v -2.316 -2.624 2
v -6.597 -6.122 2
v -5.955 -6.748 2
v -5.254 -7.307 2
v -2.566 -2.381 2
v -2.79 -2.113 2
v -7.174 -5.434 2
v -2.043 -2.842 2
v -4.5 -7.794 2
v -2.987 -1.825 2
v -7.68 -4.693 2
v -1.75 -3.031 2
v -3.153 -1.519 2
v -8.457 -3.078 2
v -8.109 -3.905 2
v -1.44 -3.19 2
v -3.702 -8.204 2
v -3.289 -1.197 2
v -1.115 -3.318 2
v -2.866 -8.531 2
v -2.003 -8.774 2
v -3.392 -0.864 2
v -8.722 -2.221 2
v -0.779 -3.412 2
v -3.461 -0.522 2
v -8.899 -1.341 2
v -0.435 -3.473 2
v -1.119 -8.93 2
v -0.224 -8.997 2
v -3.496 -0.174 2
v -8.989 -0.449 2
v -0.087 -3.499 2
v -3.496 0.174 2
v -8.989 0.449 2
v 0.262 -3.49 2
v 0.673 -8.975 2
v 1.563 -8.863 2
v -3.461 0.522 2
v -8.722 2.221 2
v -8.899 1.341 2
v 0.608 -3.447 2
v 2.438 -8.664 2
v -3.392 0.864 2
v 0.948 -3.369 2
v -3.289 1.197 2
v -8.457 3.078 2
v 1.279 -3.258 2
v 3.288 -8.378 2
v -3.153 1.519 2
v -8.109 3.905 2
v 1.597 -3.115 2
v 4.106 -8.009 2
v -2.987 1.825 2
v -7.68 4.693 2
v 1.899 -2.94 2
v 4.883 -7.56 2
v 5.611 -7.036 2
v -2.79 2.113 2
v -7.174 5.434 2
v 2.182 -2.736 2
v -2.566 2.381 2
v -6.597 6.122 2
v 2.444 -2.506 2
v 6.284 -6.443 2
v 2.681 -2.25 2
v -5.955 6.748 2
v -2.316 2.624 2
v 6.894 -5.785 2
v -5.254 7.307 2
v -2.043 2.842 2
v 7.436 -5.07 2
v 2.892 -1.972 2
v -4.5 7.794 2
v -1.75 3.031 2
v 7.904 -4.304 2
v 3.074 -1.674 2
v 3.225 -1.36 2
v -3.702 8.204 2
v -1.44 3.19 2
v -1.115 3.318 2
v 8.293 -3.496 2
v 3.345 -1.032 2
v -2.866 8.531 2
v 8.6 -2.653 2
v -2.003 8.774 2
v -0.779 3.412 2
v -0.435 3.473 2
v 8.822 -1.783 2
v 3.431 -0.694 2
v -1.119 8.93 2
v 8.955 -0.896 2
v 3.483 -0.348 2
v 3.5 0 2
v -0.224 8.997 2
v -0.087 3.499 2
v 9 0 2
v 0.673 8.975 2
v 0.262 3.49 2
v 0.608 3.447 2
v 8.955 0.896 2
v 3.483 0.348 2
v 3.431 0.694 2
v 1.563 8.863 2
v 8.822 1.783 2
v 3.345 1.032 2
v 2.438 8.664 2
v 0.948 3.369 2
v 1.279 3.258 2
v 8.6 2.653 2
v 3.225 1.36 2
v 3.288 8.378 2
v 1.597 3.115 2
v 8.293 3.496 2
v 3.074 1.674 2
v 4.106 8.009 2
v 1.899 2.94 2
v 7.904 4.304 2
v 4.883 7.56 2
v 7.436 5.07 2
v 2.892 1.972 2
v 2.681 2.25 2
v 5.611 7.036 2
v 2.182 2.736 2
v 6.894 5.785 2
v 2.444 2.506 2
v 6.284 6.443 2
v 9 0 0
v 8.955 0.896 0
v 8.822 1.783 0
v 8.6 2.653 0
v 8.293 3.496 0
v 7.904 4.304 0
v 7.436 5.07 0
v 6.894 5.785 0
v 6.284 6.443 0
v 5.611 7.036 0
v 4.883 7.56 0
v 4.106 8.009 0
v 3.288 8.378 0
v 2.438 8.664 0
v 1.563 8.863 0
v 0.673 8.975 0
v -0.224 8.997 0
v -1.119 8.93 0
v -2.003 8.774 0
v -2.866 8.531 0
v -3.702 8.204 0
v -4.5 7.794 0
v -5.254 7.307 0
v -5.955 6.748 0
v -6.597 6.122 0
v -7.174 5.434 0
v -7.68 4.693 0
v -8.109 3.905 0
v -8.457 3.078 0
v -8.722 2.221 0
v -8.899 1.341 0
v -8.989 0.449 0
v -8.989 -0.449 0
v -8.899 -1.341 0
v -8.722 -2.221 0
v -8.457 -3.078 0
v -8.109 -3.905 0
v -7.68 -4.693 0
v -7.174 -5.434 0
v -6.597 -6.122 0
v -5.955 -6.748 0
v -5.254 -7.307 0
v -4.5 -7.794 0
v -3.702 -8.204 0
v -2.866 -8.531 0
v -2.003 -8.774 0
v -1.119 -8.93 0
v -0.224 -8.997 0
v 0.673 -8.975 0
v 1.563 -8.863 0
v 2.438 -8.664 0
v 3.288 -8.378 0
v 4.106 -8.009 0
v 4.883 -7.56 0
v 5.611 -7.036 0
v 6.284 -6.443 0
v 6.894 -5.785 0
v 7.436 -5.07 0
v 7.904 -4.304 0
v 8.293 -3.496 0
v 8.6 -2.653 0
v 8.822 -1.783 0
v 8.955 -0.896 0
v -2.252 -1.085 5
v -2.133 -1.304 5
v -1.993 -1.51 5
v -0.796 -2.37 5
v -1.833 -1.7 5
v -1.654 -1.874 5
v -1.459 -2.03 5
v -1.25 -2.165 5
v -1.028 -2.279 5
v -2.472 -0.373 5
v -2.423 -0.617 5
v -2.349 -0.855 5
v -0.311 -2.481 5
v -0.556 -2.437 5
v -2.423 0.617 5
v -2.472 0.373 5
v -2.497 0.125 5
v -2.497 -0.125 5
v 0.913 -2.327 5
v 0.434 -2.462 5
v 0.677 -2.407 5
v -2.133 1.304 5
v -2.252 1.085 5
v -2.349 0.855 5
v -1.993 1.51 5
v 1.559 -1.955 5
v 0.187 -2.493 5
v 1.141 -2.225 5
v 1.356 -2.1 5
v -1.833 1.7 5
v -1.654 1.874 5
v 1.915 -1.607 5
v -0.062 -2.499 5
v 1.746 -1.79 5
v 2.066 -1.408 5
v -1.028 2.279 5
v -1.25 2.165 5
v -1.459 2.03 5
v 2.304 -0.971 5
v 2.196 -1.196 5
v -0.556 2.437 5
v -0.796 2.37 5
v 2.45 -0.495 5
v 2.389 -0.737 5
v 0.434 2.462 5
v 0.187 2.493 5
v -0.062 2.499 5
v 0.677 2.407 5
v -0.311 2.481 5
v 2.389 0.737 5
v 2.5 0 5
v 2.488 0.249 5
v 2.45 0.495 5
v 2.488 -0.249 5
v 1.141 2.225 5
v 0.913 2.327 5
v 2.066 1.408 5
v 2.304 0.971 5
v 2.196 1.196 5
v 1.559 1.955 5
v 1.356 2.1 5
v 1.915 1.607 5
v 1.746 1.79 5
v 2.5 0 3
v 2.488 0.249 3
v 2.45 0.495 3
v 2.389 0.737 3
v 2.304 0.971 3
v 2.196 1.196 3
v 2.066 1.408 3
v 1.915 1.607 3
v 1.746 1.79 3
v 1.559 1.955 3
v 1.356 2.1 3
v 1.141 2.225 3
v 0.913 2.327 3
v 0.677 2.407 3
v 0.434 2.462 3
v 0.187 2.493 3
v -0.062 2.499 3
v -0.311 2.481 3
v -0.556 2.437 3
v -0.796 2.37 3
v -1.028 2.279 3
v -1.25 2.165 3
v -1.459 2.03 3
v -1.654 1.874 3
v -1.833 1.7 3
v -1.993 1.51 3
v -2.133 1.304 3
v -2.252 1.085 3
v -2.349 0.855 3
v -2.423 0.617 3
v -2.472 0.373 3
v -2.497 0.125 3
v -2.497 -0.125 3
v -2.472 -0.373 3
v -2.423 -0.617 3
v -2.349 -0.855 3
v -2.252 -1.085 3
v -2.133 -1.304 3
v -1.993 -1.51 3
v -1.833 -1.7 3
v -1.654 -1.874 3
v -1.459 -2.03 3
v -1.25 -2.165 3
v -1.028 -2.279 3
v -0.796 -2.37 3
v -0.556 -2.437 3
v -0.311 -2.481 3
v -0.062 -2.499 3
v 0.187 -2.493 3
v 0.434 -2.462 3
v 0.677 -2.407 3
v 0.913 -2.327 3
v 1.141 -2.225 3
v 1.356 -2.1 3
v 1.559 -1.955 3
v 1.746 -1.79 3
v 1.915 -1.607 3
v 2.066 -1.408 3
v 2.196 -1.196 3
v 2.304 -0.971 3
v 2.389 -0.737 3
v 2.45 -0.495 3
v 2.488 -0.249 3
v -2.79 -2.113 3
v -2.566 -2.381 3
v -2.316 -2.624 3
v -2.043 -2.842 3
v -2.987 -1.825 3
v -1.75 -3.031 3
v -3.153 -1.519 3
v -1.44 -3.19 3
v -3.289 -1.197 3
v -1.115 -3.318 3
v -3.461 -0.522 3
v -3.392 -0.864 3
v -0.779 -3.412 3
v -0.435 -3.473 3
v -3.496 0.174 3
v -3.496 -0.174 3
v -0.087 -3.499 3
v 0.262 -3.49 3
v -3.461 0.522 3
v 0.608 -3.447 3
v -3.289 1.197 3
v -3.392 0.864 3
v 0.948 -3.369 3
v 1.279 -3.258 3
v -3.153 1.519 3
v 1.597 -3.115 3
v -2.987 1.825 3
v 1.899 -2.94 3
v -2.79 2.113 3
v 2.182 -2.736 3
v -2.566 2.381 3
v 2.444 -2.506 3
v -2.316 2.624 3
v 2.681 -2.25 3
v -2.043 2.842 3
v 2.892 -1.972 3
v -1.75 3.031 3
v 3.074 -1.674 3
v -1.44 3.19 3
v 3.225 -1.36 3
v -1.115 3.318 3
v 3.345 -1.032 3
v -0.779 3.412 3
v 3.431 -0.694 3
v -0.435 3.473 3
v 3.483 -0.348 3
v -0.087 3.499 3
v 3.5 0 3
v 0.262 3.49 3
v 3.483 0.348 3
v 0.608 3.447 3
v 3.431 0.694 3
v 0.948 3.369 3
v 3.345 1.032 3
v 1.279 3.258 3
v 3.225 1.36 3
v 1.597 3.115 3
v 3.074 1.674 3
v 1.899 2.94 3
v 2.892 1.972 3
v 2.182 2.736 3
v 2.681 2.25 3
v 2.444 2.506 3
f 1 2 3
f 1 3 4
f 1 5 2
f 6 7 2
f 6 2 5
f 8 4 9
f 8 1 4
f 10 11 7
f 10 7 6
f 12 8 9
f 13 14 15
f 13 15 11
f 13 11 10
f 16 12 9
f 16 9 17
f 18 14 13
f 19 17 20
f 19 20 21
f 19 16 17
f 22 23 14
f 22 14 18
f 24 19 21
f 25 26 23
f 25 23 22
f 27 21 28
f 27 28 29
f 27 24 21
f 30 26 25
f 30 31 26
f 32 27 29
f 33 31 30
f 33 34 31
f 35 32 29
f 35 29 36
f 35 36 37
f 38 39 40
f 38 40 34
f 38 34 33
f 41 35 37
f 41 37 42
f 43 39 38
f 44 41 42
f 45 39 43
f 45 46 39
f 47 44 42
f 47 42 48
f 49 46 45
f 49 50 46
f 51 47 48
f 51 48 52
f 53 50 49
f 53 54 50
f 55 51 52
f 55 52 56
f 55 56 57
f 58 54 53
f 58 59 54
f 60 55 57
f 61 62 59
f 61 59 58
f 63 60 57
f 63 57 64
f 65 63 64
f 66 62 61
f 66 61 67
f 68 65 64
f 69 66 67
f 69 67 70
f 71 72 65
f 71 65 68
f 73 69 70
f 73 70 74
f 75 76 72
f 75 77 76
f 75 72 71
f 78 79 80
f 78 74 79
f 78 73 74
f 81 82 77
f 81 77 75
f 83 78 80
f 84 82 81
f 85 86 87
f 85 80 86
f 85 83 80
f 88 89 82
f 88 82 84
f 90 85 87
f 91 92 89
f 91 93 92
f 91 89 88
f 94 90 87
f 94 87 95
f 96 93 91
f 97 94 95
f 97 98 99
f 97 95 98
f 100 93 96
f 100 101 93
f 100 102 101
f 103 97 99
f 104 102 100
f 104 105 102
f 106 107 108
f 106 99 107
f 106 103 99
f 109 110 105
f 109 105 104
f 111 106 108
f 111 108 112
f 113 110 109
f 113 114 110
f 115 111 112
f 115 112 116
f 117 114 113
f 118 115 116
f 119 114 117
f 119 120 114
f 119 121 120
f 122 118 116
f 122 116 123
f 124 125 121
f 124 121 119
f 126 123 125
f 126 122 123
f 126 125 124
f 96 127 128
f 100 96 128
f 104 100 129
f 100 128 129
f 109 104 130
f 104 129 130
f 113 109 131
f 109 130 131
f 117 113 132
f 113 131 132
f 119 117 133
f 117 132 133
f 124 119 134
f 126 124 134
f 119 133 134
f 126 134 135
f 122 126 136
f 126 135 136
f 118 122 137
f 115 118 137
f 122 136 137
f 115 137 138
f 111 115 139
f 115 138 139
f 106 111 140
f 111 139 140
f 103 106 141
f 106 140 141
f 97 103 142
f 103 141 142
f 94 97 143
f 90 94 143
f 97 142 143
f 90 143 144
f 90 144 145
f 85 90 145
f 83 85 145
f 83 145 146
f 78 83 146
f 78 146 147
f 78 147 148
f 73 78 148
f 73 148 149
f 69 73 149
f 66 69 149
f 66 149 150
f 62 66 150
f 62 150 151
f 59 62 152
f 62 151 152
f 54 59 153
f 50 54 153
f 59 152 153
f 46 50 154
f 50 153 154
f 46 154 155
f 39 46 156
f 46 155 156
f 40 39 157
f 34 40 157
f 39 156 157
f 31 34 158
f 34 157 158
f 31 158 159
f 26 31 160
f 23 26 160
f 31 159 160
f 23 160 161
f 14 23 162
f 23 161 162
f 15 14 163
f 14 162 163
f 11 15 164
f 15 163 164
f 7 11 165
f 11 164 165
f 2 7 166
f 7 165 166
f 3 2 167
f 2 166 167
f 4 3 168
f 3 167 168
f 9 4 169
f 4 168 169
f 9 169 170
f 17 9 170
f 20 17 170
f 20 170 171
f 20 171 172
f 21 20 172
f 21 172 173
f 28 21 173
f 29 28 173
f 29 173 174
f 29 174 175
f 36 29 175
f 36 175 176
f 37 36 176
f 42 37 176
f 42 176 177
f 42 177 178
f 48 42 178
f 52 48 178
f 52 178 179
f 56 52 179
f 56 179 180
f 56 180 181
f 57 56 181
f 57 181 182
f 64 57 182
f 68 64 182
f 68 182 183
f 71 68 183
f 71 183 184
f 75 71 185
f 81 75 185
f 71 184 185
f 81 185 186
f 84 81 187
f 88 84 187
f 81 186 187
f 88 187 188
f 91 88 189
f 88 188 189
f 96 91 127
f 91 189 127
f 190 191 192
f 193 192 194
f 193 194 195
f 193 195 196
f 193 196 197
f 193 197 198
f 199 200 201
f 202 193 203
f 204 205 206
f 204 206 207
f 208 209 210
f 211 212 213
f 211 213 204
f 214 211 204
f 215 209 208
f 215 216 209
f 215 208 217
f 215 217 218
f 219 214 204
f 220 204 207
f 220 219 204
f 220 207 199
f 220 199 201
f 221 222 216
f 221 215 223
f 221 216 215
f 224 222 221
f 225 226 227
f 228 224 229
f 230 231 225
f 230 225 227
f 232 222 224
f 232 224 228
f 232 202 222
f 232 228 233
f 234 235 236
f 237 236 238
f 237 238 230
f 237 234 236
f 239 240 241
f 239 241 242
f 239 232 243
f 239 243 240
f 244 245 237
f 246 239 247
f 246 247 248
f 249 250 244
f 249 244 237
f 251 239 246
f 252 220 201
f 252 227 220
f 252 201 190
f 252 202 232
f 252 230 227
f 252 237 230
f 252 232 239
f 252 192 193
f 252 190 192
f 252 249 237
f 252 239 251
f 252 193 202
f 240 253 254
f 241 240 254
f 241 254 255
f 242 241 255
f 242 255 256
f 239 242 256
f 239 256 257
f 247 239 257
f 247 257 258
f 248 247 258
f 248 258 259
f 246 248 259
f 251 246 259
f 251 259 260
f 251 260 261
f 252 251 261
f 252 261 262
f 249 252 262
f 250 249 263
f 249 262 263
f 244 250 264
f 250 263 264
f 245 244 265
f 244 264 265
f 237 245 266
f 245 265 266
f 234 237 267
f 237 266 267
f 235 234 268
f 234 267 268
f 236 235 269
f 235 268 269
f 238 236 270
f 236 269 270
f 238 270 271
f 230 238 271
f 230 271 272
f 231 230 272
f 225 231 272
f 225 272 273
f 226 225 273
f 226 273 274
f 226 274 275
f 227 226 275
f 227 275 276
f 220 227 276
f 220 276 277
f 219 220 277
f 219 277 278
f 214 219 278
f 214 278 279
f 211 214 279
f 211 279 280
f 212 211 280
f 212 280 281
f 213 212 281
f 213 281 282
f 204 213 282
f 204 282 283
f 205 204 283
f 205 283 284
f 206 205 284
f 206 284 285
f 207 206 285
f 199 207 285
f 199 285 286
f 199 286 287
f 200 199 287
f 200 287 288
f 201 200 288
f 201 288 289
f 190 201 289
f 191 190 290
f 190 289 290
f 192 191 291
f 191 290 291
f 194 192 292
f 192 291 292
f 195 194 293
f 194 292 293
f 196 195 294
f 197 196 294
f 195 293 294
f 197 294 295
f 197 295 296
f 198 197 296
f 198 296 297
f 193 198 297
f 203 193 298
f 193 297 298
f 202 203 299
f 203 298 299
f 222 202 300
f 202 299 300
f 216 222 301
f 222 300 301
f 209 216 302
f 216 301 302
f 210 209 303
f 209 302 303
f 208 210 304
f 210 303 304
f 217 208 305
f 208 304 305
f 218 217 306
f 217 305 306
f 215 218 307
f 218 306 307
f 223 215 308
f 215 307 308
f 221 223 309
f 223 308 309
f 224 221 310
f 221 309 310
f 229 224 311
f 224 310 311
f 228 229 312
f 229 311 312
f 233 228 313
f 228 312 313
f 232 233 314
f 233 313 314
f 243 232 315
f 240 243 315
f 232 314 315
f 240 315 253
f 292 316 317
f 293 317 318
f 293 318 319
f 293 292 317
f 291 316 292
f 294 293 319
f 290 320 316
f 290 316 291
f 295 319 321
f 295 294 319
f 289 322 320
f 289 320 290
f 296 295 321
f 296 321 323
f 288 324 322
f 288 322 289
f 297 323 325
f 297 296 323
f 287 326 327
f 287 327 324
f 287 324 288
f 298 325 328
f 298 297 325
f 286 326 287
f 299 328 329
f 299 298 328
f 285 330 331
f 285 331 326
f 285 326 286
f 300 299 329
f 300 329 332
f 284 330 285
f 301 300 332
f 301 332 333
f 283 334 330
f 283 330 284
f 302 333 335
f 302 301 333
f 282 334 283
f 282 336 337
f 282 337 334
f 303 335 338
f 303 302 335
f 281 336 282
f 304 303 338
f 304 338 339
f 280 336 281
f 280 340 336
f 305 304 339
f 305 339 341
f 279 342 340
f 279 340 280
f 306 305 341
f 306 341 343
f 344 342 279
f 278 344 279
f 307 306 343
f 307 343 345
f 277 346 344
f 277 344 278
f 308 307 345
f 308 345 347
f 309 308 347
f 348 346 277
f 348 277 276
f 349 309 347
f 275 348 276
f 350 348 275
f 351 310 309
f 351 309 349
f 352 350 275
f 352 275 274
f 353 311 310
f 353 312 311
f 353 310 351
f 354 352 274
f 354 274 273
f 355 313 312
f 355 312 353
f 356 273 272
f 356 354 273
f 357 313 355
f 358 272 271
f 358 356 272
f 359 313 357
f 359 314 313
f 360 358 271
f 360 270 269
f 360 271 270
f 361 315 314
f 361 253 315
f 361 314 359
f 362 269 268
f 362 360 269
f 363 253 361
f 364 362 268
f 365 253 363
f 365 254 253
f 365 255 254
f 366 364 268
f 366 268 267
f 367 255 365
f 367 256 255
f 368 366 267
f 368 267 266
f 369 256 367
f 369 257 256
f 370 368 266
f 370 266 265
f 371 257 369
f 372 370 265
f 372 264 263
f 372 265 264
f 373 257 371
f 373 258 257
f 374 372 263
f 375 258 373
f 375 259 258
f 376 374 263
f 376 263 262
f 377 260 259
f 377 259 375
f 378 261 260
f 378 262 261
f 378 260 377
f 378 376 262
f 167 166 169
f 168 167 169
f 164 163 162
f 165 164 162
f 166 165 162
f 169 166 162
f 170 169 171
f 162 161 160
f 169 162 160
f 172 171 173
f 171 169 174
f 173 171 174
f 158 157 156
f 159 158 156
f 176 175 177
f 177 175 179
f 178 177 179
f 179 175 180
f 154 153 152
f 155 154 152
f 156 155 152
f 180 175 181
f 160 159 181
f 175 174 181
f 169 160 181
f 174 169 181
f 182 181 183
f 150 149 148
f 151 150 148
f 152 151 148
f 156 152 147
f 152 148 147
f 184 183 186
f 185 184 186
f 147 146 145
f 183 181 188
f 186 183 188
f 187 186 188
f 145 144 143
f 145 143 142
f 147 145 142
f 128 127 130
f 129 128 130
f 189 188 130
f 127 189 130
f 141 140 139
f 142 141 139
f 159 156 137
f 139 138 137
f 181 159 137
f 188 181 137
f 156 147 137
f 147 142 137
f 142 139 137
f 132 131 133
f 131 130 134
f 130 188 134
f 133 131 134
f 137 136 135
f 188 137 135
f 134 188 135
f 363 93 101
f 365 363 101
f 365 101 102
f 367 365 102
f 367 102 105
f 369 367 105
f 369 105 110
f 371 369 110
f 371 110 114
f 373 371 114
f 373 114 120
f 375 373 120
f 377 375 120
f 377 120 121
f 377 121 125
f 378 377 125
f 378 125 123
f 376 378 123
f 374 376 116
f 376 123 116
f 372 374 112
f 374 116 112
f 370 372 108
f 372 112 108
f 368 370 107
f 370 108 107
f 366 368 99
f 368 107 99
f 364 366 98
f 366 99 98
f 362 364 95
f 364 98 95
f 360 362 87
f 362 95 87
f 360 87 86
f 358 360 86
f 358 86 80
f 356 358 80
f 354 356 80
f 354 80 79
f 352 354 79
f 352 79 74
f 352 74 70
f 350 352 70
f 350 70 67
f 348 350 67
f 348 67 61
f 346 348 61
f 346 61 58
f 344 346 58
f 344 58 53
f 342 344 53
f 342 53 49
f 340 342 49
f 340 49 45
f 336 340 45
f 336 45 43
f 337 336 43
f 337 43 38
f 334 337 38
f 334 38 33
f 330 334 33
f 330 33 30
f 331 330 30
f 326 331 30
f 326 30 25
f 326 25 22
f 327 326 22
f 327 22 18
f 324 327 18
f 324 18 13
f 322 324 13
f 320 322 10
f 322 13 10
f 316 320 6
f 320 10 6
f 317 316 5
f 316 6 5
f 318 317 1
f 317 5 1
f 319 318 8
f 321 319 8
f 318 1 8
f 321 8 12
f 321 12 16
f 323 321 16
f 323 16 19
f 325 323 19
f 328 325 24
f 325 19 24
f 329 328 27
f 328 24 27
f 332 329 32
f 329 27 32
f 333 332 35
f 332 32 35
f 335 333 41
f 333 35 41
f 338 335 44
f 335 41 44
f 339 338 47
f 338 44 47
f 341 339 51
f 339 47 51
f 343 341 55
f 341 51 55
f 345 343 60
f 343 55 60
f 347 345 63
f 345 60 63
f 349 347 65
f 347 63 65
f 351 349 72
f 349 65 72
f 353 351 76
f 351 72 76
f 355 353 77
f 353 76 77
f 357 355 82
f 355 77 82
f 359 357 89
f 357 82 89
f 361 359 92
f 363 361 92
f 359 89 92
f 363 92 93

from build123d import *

# Parameters (mm, degrees)
F1_R     = 9
F1_R_2   = 3.5
F2_DEPTH = 2
F0_R     = 3.5
F0_R_2   = 2.5
F4_DEPTH = 3
F5_R     = 2.5
F3_R     = 2.5
F6_DEPTH = 5


with BuildPart() as f2:
    # F1 (on face) → F2 (new body)
    with BuildSketch(Plane.XY):
        Circle(F1_R)
        Circle(F1_R_2, mode=Mode.SUBTRACT)
    extrude(amount=F2_DEPTH)

    # F0 (on Top) → F4 (join)
    with BuildSketch(Plane.XY):
        Circle(F0_R)
        Circle(F0_R_2, mode=Mode.SUBTRACT)
    extrude(amount=F4_DEPTH)

    # F5 (on Top) + F3 (on face) → F6 (join)
    with BuildSketch(Plane.XY):
        Circle(F5_R)
    with BuildSketch(Plane.XY):
        Circle(F3_R)
    extrude(amount=F6_DEPTH)


solid = f2.part
